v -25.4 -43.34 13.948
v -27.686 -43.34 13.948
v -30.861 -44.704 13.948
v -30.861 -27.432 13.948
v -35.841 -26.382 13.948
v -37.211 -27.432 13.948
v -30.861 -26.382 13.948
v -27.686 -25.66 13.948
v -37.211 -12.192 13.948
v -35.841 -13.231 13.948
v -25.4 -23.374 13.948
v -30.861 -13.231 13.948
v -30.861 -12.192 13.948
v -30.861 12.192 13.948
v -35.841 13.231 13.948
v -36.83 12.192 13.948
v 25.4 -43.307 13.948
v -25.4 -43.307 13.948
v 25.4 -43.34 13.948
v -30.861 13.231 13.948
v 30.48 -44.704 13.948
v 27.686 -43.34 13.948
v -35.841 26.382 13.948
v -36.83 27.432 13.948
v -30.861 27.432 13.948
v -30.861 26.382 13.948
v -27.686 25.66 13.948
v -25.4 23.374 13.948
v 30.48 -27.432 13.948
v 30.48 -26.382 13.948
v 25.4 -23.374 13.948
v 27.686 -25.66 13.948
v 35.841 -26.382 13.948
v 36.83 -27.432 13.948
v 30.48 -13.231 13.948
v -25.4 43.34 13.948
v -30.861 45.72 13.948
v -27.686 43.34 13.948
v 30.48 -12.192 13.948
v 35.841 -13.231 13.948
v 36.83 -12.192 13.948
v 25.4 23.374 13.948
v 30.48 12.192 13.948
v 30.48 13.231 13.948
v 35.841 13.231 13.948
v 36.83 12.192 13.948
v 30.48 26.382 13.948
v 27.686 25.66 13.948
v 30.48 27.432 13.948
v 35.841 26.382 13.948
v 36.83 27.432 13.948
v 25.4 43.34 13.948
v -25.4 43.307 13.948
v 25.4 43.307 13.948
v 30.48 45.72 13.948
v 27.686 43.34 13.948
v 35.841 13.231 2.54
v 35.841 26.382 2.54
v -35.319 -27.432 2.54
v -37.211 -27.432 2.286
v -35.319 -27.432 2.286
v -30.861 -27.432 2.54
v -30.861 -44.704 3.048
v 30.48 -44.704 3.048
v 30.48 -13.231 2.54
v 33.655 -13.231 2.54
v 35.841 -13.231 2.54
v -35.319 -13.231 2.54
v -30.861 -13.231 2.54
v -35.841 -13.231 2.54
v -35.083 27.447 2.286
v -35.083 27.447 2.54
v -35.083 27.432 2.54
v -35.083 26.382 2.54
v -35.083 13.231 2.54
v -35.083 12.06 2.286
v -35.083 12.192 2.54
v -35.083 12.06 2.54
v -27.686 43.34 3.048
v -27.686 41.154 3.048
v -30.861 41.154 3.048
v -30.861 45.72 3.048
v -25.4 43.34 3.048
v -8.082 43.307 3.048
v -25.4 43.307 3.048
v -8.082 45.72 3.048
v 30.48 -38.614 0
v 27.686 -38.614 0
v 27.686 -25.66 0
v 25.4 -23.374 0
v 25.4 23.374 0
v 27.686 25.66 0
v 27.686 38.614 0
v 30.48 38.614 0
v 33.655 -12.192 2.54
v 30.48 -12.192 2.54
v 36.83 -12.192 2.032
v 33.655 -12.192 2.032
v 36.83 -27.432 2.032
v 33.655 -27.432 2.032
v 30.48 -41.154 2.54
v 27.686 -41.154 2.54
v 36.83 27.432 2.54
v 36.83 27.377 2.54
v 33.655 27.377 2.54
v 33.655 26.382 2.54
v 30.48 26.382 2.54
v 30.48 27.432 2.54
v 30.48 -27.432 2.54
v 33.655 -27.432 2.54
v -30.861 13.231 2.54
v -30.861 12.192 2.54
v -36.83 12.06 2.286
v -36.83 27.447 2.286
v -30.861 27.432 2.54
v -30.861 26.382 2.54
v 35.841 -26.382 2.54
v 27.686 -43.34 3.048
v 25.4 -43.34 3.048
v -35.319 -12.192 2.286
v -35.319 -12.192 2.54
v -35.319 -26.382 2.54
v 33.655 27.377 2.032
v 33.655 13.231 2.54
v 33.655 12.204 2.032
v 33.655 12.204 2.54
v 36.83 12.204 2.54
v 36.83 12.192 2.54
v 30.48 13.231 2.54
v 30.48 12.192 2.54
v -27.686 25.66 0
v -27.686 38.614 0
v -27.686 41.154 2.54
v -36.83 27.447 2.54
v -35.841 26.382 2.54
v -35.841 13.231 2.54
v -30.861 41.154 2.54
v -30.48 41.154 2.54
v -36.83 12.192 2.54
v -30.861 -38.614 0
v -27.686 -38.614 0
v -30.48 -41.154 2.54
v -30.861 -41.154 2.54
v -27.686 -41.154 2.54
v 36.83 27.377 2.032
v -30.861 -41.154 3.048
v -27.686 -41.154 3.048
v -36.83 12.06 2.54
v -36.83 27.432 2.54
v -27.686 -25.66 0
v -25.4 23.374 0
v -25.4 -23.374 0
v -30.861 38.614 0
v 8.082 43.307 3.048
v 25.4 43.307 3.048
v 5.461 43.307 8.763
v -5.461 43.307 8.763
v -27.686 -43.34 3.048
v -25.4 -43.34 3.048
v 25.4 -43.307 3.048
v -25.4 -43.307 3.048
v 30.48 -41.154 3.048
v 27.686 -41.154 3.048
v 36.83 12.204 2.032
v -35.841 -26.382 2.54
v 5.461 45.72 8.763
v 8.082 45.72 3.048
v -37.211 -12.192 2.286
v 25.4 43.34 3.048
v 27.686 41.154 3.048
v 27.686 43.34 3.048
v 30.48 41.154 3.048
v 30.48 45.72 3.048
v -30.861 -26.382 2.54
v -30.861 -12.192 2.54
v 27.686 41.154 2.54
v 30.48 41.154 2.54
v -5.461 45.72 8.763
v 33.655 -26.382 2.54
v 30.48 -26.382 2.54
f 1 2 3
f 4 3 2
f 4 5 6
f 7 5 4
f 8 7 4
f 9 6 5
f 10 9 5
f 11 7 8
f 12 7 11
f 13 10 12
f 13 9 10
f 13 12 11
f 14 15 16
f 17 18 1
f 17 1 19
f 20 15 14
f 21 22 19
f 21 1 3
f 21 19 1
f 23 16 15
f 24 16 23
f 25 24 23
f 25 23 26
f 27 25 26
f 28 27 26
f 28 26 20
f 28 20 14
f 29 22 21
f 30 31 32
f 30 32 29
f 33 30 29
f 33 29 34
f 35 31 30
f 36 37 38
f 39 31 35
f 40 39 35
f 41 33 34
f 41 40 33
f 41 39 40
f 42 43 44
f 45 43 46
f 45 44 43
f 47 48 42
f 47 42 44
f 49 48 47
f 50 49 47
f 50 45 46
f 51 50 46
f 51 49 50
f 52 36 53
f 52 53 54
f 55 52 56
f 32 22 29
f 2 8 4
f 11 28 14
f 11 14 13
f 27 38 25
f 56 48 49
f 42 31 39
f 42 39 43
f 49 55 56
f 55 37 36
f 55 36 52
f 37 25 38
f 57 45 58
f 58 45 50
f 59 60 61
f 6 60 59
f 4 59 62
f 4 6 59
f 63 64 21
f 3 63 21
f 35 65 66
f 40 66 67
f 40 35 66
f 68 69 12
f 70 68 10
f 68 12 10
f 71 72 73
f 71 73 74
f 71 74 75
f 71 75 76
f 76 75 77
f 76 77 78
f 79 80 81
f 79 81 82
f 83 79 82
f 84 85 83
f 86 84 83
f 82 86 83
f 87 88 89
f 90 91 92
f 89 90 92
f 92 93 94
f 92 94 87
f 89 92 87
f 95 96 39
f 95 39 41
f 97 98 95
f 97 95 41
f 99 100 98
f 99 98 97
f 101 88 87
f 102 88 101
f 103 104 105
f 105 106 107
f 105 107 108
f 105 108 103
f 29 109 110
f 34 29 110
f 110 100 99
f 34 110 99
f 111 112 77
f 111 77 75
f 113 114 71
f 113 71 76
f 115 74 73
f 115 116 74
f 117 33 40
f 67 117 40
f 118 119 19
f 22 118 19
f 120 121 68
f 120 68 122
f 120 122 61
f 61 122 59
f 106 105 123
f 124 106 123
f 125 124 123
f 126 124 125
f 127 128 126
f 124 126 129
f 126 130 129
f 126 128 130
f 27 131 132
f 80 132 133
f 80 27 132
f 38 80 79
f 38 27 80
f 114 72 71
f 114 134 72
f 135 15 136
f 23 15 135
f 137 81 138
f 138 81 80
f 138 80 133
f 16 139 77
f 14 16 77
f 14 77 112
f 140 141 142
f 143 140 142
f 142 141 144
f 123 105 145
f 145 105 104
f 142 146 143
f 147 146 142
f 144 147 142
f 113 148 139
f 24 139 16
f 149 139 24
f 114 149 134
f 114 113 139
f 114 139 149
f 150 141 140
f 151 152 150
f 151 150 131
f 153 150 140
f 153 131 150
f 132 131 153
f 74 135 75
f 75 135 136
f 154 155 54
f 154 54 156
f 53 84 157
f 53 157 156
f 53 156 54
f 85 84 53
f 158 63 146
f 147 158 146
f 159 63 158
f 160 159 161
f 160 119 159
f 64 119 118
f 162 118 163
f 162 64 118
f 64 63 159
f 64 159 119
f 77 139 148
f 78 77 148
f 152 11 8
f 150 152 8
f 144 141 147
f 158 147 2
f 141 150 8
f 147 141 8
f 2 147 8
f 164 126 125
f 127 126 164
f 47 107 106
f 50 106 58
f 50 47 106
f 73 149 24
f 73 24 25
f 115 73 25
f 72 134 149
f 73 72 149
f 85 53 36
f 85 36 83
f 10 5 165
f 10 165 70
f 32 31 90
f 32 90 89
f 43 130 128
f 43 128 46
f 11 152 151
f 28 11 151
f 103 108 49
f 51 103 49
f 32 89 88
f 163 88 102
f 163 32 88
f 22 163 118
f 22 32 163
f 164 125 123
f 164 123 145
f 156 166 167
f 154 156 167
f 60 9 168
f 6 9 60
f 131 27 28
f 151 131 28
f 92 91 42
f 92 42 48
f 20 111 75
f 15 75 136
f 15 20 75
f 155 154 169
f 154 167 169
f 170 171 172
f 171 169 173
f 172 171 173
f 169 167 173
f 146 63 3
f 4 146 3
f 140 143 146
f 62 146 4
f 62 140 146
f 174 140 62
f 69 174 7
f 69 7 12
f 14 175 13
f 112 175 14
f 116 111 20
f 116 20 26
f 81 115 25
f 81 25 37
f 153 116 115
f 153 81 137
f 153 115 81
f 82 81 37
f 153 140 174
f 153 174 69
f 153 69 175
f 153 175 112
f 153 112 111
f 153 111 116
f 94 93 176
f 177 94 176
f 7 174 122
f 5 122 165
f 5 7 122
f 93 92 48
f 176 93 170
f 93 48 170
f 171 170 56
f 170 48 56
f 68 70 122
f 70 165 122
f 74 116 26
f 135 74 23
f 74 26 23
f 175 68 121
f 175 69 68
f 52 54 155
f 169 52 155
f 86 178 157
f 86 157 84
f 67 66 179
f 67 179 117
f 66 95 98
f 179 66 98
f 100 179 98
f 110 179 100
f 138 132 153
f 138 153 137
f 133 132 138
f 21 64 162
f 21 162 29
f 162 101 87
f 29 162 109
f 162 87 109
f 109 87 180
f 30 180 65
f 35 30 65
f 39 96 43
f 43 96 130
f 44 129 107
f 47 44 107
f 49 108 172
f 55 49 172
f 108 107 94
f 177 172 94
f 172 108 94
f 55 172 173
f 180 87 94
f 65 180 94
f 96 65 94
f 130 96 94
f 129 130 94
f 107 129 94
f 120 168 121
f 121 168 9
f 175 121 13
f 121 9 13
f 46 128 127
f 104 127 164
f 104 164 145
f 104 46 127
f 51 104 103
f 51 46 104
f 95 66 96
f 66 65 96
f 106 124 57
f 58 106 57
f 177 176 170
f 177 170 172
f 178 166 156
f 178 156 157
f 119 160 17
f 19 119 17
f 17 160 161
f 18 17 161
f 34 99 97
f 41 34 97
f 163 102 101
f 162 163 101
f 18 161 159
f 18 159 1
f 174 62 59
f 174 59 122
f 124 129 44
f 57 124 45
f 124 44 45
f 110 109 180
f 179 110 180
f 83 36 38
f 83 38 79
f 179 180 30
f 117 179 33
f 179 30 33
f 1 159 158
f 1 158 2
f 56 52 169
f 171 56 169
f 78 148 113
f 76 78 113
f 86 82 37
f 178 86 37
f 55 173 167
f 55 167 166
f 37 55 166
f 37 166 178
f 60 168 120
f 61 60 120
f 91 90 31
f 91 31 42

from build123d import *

# Parameters (mm, degrees)
F0_W          = 60.96
F0_H          = 91.44
F0_W_2        = 50.8
F0_H_2        = 86.614
F1_DEPTH      = 28.448
F3_DEPTH      = 25.4
F4_W          = 66.649839282
F4_H          = 6.9823637605
F5_DEPTH      = 3.048
F6_W          = 64.9686481762
F6_H          = 4.777956934
F7_DEPTH      = 3.048
F9_DEPTH      = 2.286
F10_W         = 99.848318845
F10_H         = 48.2080141082
F11_DEPTH     = 50.8
F13_T1_DEPTH  = 15.8581495789
F13_T3_DEPTH  = 15.8581495789
F13_T8_DEPTH  = 41.5121495789
F13_T13_DEPTH = 41.5121495789
F13_T18_DEPTH = 41.5121495789
F13_T23_DEPTH = 41.5121495789
F14_W         = 15.24
F14_H         = 23.368
F15_DEPTH     = 6.35
F16_W         = 5.3607832682
F16_H         = 13.1506472826
F17_DEPTH     = 25.909
F19_DEPTH     = 0.254
F20_DEPTH     = 0.254
F21_DEPTH     = 1.016
F22_W         = 3.175
F22_H         = 15.24
F22_H_2       = 15.425526537
F23_DEPTH     = 0.508
F24_W         = 3.175
F24_H         = 15.24
F24_H_2       = 15.1729788631
F25_DEPTH     = 0.508
F26_W         = 1.4869117904
F26_H         = 15.24
F26_H_2       = 15.1544166729
F27_DEPTH     = 0.508
F28_W         = 1.5113
F28_H         = 15.24
F28_W_2       = 1.492887156
F28_H_2       = 15.3870563954
F29_DEPTH     = 0.254
F30_DEPTH     = 0.381
F31_DEPTH     = 0.254
F32_W         = 105.9566885233
F32_H         = 116.2753328681
F33_DEPTH     = 14.5


# Not quite as in the source:
# - a fillet or chamfer that OpenCascade refuses, or shapes differently, is made with other operations: its cross-section is extruded or revolved along the edge and cut away or added
# - a feature names something its author has since deleted; it is built from what else it names


with BuildPart() as f1:
    # F0 (on Top) → F1 (new body)
    with BuildSketch(Plane.XY):
        Rectangle(F0_W, F0_H)
        Rectangle(F0_W_2, F0_H_2, mode=Mode.SUBTRACT)
    extrude(amount=F1_DEPTH)

    # F2 (on face) → F3 (cut)
    with BuildSketch(Plane(origin=(0, 45.72, 0), x_dir=(-1, 0, 0), z_dir=(0, 1, 0))):
        Polygon((-9.4803553075, 0), (0, 0), (9.4803553075, 0), (5.461, 8.763), (-5.461, 8.763), align=None)
        Polygon((-9.4803553075, 28.448), (-5.461, 19.685), (5.461, 19.685), (9.4803553075, 28.448), (0, 28.448), align=None)
    extrude(amount=-F3_DEPTH, mode=Mode.SUBTRACT)

    # F4 (on Top) → F5 (cut)
    with BuildSketch(Plane.XY):
        with Locations((-0.1057945192, 44.6448102593)):
            Rectangle(F4_W, F4_H)
        with Locations((-0.1057945192, -44.6448102593)):
            Rectangle(F4_W, F4_H)
    extrude(amount=F5_DEPTH, mode=Mode.SUBTRACT)

    # F6 (on face) → F7 (cut)
    with BuildSketch(Plane.XY.offset(28.448)):
        with Locations((-2.0043240881, 43.331021533)):
            Rectangle(F6_W, F6_H)
        with Locations((-2.0043240881, -43.331021533)):
            Rectangle(F6_W, F6_H)
    extrude(amount=-F7_DEPTH, mode=Mode.SUBTRACT)

    # F8 (on face) → F9 (cut)
    with BuildSketch(Plane(origin=(25.4, 0, 0), x_dir=(0, -1, 0), z_dir=(-1, 0, 0))):
        Polygon((-43.0863499641, 0), (-41.1536283791, 0), (-25.9136283791, 0), (-25.9136283791, 30.48), (-41.1536283791, 30.48), (-43.0863499641, 30.48), align=None)
        Polygon((25.9136283791, 30.48), (25.9136283791, 0), (41.1536283791, 0), (43.0863499641, 0), (43.0863499641, 30.48), (41.1536283791, 30.48), align=None)
    extrude(amount=-F9_DEPTH, mode=Mode.SUBTRACT)

    # F10 (on Right) → F11 (cut)
    with BuildSketch(Plane.YZ):
        with Locations((1.7518345267, 13.4315635078)):
            Rectangle(F10_W, F10_H)
    extrude(amount=-F11_DEPTH, mode=Mode.SUBTRACT)

    # F12: F1 across plane


with BuildPart() as f1_1:
    add(f1.part)
    add(f1.part.mirror(Plane.YZ))

    # F13: chamfer of 2.54 on 12 edges, made by hand

    # F13_s2 → F13_t1 (cut)
    with BuildSketch(Plane.YZ.offset(-37.0120747894)):
        Polygon((38.402043066, 28.448), (40.942043066, 25.908), (40.942043066, 28.448), align=None)
        Polygon((38.6136283791, 0), (41.1536283791, 2.54), (41.1536283791, 0), align=None)
        Polygon((-40.942043066, 25.908), (-38.402043066, 28.448), (-40.942043066, 28.448), align=None)
        Polygon((-38.6136283791, 0), (-41.1536283791, 2.54), (-41.1536283791, 0), align=None)
    extrude(amount=F13_T1_DEPTH, mode=Mode.SUBTRACT)

    # F13_s4 → F13_t3 (cut)
    with BuildSketch(Plane.YZ.offset(21.1539252106)):
        Polygon((38.402043066, 28.448), (40.942043066, 25.908), (40.942043066, 28.448), align=None)
        Polygon((-40.942043066, 25.908), (-38.402043066, 28.448), (-40.942043066, 28.448), align=None)
        Polygon((-38.6136283791, 0), (-41.1536283791, 2.54), (-41.1536283791, 0), align=None)
        Polygon((38.6136283791, 0), (41.1536283791, 2.54), (41.1536283791, 0), align=None)
    extrude(amount=F13_T3_DEPTH, mode=Mode.SUBTRACT)


with BuildPart() as f13_tool6:
    # F13_s7 → F13_t8 (new body)
    with BuildSketch(Plane.XY.offset(-6.5320747894)):
        Polygon((25.4, 23.3736283791), (27.94, 25.9136283791), (25.4, 25.9136283791), align=None)
    extrude(amount=F13_T8_DEPTH)

    split(bisect_by=Plane.YZ.offset(27.686), keep=Keep.BOTTOM)


with BuildPart() as f1_2:
    add(f1_1.part)

    # F13_t5: cut F13_tool6
    add(f13_tool6.part, mode=Mode.SUBTRACT)


with BuildPart() as f13_tool11:
    # F13_s12 → F13_t13 (new body)
    with BuildSketch(Plane.XY.offset(34.9800747894)):
        Polygon((25.4, -23.3736283791), (27.94, -25.9136283791), (25.4, -25.9136283791), align=None)
    extrude(amount=-F13_T13_DEPTH)

    split(bisect_by=Plane.YZ.offset(27.686), keep=Keep.BOTTOM)


with BuildPart() as f1_3:
    add(f1_2.part)

    # F13_t10: cut F13_tool11
    add(f13_tool11.part, mode=Mode.SUBTRACT)


with BuildPart() as f13_tool16:
    # F13_s17 → F13_t18 (new body)
    with BuildSketch(Plane.XY.offset(-6.5320747894)):
        Polygon((-27.94, 25.9136283791), (-25.4, 23.3736283791), (-25.4, 25.9136283791), align=None)
    extrude(amount=F13_T18_DEPTH)

    split(bisect_by=Plane.YZ.offset(-27.686), keep=Keep.TOP)


with BuildPart() as f1_4:
    add(f1_3.part)

    # F13_t15: cut F13_tool16
    add(f13_tool16.part, mode=Mode.SUBTRACT)


with BuildPart() as f13_tool21:
    # F13_s22 → F13_t23 (new body)
    with BuildSketch(Plane.XY.offset(34.9800747894)):
        Polygon((-25.4, -23.3736283791), (-27.94, -25.9136283791), (-25.4, -25.9136283791), align=None)
    extrude(amount=-F13_T23_DEPTH)

    split(bisect_by=Plane.YZ.offset(-27.686), keep=Keep.TOP)


with BuildPart() as f1_5:
    add(f1_4.part)

    # F13_t20: cut F13_tool21
    add(f13_tool21.part, mode=Mode.SUBTRACT)

    # F14 (on face) → F15 (join)
    with BuildSketch(Plane.YZ.offset(30.48)):
        with Locations((-19.812, 14.224)):
            Rectangle(F14_W, F14_H)
        with Locations((19.812, 14.224)):
            Rectangle(F14_W, F14_H)
    extrude(amount=F15_DEPTH)

    # F16 (on face) → F17 (cut, through all)
    with BuildSketch(Plane.XY.offset(25.908)):
        with Locations((33.1603916341, -19.8066011071)):
            Rectangle(F16_W, F16_H)
        with Locations((33.1603916341, 19.8066011071)):
            Rectangle(F16_W, F16_H)
    extrude(amount=-F17_DEPTH, mode=Mode.SUBTRACT)

    # F18: F1 across plane


with BuildPart() as f1_6:
    add(f1_5.part)
    add(f1_5.part.mirror(Plane.YZ))

    # F19 (cut): faces of the model
    f19_faces = [f1_6.faces().sort_by_distance(p)[0] for p in [
        (26.543, -43.0863499641, 14.224),
        (-26.543, -43.0863499641, 14.224),
    ]]
    extrude(f19_faces, amount=-F19_DEPTH, mode=Mode.SUBTRACT)

    # F20 (cut): faces of the model
    f20_faces = [f1_6.faces().sort_by_distance(p)[0] for p in [
        (26.543, 43.0863499641, 14.224),
        (-26.543, 43.0863499641, 14.224),
    ]]
    extrude(f20_faces, amount=-F20_DEPTH, mode=Mode.SUBTRACT)

    # F21 (cut): a face of the model
    f21_faces = [f1_6.faces().sort_by_distance(p)[0] for p in [
        (0, -45.72, 14.224),
    ]]
    extrude(f21_faces, amount=-F21_DEPTH, mode=Mode.SUBTRACT)

    # F22 (on face) → F23 (join)
    with BuildSketch(Plane.XY.offset(25.908)):
        with Locations((-35.2425, 19.812)):
            Rectangle(F22_W, F22_H)
        with Locations((-35.2425, -19.7230628692)):
            Rectangle(F22_W, F22_H_2)
    extrude(amount=F23_DEPTH)

    # F24 (on face) → F25 (join)
    with BuildSketch(Plane(origin=(0, 0, 2.54), x_dir=(1, 0, 0), z_dir=(0, 0, -1))):
        with Locations((35.2425, 19.812)):
            Rectangle(F24_W, F24_H)
        with Locations((35.2425, -19.7903430089)):
            Rectangle(F24_W, F24_H_2)
    extrude(amount=F25_DEPTH)

    # F26 (on face) → F27 (join)
    with BuildSketch(Plane.XY.offset(25.908)):
        with Locations((36.0865441048, -19.812)):
            Rectangle(F26_W, F26_H)
        with Locations((36.0865441048, 19.7994005866)):
            Rectangle(F26_W, F26_H_2)
    extrude(amount=F27_DEPTH)

    # F28 (on face) → F29 (join)
    with BuildSketch(Plane(origin=(0, 0, 2.54), x_dir=(1, 0, 0), z_dir=(0, 0, -1))):
        with Locations((-36.07435, 19.812)):
            Rectangle(F28_W, F28_H)
        with Locations((-36.083556422, -19.7531366721)):
            Rectangle(F28_W_2, F28_H_2)
    extrude(amount=F29_DEPTH)

    # F30 (add): faces of the model
    f30_faces = [f1_6.faces().sort_by_distance(p)[0] for p in [
        (-30.48, 0.4258489378, 14.2172059936),
        (-35.3187, -19.812, 2.413),
        (-35.8407832682, -19.8066011071, 14.224),
        (-36.83, -19.8101053315, 14.3540262363),
    ]]
    extrude(f30_faces, amount=F30_DEPTH, dir=(-1, 0, 0))

    # F31 (add): a face of the model
    f31_faces = [f1_6.faces().sort_by_distance(p)[0] for p in [
        (-35.337112844, 19.7531366721, 2.413),
    ]]
    extrude(f31_faces, amount=F31_DEPTH)

    # F32 (on face) → F33 (cut)
    with BuildSketch(Plane.XY.offset(28.448)):
        with Locations((11.0789313912, -7.9427920282)):
            Rectangle(F32_W, F32_H)
    extrude(amount=-F33_DEPTH, mode=Mode.SUBTRACT)


solid = f1_6.part
